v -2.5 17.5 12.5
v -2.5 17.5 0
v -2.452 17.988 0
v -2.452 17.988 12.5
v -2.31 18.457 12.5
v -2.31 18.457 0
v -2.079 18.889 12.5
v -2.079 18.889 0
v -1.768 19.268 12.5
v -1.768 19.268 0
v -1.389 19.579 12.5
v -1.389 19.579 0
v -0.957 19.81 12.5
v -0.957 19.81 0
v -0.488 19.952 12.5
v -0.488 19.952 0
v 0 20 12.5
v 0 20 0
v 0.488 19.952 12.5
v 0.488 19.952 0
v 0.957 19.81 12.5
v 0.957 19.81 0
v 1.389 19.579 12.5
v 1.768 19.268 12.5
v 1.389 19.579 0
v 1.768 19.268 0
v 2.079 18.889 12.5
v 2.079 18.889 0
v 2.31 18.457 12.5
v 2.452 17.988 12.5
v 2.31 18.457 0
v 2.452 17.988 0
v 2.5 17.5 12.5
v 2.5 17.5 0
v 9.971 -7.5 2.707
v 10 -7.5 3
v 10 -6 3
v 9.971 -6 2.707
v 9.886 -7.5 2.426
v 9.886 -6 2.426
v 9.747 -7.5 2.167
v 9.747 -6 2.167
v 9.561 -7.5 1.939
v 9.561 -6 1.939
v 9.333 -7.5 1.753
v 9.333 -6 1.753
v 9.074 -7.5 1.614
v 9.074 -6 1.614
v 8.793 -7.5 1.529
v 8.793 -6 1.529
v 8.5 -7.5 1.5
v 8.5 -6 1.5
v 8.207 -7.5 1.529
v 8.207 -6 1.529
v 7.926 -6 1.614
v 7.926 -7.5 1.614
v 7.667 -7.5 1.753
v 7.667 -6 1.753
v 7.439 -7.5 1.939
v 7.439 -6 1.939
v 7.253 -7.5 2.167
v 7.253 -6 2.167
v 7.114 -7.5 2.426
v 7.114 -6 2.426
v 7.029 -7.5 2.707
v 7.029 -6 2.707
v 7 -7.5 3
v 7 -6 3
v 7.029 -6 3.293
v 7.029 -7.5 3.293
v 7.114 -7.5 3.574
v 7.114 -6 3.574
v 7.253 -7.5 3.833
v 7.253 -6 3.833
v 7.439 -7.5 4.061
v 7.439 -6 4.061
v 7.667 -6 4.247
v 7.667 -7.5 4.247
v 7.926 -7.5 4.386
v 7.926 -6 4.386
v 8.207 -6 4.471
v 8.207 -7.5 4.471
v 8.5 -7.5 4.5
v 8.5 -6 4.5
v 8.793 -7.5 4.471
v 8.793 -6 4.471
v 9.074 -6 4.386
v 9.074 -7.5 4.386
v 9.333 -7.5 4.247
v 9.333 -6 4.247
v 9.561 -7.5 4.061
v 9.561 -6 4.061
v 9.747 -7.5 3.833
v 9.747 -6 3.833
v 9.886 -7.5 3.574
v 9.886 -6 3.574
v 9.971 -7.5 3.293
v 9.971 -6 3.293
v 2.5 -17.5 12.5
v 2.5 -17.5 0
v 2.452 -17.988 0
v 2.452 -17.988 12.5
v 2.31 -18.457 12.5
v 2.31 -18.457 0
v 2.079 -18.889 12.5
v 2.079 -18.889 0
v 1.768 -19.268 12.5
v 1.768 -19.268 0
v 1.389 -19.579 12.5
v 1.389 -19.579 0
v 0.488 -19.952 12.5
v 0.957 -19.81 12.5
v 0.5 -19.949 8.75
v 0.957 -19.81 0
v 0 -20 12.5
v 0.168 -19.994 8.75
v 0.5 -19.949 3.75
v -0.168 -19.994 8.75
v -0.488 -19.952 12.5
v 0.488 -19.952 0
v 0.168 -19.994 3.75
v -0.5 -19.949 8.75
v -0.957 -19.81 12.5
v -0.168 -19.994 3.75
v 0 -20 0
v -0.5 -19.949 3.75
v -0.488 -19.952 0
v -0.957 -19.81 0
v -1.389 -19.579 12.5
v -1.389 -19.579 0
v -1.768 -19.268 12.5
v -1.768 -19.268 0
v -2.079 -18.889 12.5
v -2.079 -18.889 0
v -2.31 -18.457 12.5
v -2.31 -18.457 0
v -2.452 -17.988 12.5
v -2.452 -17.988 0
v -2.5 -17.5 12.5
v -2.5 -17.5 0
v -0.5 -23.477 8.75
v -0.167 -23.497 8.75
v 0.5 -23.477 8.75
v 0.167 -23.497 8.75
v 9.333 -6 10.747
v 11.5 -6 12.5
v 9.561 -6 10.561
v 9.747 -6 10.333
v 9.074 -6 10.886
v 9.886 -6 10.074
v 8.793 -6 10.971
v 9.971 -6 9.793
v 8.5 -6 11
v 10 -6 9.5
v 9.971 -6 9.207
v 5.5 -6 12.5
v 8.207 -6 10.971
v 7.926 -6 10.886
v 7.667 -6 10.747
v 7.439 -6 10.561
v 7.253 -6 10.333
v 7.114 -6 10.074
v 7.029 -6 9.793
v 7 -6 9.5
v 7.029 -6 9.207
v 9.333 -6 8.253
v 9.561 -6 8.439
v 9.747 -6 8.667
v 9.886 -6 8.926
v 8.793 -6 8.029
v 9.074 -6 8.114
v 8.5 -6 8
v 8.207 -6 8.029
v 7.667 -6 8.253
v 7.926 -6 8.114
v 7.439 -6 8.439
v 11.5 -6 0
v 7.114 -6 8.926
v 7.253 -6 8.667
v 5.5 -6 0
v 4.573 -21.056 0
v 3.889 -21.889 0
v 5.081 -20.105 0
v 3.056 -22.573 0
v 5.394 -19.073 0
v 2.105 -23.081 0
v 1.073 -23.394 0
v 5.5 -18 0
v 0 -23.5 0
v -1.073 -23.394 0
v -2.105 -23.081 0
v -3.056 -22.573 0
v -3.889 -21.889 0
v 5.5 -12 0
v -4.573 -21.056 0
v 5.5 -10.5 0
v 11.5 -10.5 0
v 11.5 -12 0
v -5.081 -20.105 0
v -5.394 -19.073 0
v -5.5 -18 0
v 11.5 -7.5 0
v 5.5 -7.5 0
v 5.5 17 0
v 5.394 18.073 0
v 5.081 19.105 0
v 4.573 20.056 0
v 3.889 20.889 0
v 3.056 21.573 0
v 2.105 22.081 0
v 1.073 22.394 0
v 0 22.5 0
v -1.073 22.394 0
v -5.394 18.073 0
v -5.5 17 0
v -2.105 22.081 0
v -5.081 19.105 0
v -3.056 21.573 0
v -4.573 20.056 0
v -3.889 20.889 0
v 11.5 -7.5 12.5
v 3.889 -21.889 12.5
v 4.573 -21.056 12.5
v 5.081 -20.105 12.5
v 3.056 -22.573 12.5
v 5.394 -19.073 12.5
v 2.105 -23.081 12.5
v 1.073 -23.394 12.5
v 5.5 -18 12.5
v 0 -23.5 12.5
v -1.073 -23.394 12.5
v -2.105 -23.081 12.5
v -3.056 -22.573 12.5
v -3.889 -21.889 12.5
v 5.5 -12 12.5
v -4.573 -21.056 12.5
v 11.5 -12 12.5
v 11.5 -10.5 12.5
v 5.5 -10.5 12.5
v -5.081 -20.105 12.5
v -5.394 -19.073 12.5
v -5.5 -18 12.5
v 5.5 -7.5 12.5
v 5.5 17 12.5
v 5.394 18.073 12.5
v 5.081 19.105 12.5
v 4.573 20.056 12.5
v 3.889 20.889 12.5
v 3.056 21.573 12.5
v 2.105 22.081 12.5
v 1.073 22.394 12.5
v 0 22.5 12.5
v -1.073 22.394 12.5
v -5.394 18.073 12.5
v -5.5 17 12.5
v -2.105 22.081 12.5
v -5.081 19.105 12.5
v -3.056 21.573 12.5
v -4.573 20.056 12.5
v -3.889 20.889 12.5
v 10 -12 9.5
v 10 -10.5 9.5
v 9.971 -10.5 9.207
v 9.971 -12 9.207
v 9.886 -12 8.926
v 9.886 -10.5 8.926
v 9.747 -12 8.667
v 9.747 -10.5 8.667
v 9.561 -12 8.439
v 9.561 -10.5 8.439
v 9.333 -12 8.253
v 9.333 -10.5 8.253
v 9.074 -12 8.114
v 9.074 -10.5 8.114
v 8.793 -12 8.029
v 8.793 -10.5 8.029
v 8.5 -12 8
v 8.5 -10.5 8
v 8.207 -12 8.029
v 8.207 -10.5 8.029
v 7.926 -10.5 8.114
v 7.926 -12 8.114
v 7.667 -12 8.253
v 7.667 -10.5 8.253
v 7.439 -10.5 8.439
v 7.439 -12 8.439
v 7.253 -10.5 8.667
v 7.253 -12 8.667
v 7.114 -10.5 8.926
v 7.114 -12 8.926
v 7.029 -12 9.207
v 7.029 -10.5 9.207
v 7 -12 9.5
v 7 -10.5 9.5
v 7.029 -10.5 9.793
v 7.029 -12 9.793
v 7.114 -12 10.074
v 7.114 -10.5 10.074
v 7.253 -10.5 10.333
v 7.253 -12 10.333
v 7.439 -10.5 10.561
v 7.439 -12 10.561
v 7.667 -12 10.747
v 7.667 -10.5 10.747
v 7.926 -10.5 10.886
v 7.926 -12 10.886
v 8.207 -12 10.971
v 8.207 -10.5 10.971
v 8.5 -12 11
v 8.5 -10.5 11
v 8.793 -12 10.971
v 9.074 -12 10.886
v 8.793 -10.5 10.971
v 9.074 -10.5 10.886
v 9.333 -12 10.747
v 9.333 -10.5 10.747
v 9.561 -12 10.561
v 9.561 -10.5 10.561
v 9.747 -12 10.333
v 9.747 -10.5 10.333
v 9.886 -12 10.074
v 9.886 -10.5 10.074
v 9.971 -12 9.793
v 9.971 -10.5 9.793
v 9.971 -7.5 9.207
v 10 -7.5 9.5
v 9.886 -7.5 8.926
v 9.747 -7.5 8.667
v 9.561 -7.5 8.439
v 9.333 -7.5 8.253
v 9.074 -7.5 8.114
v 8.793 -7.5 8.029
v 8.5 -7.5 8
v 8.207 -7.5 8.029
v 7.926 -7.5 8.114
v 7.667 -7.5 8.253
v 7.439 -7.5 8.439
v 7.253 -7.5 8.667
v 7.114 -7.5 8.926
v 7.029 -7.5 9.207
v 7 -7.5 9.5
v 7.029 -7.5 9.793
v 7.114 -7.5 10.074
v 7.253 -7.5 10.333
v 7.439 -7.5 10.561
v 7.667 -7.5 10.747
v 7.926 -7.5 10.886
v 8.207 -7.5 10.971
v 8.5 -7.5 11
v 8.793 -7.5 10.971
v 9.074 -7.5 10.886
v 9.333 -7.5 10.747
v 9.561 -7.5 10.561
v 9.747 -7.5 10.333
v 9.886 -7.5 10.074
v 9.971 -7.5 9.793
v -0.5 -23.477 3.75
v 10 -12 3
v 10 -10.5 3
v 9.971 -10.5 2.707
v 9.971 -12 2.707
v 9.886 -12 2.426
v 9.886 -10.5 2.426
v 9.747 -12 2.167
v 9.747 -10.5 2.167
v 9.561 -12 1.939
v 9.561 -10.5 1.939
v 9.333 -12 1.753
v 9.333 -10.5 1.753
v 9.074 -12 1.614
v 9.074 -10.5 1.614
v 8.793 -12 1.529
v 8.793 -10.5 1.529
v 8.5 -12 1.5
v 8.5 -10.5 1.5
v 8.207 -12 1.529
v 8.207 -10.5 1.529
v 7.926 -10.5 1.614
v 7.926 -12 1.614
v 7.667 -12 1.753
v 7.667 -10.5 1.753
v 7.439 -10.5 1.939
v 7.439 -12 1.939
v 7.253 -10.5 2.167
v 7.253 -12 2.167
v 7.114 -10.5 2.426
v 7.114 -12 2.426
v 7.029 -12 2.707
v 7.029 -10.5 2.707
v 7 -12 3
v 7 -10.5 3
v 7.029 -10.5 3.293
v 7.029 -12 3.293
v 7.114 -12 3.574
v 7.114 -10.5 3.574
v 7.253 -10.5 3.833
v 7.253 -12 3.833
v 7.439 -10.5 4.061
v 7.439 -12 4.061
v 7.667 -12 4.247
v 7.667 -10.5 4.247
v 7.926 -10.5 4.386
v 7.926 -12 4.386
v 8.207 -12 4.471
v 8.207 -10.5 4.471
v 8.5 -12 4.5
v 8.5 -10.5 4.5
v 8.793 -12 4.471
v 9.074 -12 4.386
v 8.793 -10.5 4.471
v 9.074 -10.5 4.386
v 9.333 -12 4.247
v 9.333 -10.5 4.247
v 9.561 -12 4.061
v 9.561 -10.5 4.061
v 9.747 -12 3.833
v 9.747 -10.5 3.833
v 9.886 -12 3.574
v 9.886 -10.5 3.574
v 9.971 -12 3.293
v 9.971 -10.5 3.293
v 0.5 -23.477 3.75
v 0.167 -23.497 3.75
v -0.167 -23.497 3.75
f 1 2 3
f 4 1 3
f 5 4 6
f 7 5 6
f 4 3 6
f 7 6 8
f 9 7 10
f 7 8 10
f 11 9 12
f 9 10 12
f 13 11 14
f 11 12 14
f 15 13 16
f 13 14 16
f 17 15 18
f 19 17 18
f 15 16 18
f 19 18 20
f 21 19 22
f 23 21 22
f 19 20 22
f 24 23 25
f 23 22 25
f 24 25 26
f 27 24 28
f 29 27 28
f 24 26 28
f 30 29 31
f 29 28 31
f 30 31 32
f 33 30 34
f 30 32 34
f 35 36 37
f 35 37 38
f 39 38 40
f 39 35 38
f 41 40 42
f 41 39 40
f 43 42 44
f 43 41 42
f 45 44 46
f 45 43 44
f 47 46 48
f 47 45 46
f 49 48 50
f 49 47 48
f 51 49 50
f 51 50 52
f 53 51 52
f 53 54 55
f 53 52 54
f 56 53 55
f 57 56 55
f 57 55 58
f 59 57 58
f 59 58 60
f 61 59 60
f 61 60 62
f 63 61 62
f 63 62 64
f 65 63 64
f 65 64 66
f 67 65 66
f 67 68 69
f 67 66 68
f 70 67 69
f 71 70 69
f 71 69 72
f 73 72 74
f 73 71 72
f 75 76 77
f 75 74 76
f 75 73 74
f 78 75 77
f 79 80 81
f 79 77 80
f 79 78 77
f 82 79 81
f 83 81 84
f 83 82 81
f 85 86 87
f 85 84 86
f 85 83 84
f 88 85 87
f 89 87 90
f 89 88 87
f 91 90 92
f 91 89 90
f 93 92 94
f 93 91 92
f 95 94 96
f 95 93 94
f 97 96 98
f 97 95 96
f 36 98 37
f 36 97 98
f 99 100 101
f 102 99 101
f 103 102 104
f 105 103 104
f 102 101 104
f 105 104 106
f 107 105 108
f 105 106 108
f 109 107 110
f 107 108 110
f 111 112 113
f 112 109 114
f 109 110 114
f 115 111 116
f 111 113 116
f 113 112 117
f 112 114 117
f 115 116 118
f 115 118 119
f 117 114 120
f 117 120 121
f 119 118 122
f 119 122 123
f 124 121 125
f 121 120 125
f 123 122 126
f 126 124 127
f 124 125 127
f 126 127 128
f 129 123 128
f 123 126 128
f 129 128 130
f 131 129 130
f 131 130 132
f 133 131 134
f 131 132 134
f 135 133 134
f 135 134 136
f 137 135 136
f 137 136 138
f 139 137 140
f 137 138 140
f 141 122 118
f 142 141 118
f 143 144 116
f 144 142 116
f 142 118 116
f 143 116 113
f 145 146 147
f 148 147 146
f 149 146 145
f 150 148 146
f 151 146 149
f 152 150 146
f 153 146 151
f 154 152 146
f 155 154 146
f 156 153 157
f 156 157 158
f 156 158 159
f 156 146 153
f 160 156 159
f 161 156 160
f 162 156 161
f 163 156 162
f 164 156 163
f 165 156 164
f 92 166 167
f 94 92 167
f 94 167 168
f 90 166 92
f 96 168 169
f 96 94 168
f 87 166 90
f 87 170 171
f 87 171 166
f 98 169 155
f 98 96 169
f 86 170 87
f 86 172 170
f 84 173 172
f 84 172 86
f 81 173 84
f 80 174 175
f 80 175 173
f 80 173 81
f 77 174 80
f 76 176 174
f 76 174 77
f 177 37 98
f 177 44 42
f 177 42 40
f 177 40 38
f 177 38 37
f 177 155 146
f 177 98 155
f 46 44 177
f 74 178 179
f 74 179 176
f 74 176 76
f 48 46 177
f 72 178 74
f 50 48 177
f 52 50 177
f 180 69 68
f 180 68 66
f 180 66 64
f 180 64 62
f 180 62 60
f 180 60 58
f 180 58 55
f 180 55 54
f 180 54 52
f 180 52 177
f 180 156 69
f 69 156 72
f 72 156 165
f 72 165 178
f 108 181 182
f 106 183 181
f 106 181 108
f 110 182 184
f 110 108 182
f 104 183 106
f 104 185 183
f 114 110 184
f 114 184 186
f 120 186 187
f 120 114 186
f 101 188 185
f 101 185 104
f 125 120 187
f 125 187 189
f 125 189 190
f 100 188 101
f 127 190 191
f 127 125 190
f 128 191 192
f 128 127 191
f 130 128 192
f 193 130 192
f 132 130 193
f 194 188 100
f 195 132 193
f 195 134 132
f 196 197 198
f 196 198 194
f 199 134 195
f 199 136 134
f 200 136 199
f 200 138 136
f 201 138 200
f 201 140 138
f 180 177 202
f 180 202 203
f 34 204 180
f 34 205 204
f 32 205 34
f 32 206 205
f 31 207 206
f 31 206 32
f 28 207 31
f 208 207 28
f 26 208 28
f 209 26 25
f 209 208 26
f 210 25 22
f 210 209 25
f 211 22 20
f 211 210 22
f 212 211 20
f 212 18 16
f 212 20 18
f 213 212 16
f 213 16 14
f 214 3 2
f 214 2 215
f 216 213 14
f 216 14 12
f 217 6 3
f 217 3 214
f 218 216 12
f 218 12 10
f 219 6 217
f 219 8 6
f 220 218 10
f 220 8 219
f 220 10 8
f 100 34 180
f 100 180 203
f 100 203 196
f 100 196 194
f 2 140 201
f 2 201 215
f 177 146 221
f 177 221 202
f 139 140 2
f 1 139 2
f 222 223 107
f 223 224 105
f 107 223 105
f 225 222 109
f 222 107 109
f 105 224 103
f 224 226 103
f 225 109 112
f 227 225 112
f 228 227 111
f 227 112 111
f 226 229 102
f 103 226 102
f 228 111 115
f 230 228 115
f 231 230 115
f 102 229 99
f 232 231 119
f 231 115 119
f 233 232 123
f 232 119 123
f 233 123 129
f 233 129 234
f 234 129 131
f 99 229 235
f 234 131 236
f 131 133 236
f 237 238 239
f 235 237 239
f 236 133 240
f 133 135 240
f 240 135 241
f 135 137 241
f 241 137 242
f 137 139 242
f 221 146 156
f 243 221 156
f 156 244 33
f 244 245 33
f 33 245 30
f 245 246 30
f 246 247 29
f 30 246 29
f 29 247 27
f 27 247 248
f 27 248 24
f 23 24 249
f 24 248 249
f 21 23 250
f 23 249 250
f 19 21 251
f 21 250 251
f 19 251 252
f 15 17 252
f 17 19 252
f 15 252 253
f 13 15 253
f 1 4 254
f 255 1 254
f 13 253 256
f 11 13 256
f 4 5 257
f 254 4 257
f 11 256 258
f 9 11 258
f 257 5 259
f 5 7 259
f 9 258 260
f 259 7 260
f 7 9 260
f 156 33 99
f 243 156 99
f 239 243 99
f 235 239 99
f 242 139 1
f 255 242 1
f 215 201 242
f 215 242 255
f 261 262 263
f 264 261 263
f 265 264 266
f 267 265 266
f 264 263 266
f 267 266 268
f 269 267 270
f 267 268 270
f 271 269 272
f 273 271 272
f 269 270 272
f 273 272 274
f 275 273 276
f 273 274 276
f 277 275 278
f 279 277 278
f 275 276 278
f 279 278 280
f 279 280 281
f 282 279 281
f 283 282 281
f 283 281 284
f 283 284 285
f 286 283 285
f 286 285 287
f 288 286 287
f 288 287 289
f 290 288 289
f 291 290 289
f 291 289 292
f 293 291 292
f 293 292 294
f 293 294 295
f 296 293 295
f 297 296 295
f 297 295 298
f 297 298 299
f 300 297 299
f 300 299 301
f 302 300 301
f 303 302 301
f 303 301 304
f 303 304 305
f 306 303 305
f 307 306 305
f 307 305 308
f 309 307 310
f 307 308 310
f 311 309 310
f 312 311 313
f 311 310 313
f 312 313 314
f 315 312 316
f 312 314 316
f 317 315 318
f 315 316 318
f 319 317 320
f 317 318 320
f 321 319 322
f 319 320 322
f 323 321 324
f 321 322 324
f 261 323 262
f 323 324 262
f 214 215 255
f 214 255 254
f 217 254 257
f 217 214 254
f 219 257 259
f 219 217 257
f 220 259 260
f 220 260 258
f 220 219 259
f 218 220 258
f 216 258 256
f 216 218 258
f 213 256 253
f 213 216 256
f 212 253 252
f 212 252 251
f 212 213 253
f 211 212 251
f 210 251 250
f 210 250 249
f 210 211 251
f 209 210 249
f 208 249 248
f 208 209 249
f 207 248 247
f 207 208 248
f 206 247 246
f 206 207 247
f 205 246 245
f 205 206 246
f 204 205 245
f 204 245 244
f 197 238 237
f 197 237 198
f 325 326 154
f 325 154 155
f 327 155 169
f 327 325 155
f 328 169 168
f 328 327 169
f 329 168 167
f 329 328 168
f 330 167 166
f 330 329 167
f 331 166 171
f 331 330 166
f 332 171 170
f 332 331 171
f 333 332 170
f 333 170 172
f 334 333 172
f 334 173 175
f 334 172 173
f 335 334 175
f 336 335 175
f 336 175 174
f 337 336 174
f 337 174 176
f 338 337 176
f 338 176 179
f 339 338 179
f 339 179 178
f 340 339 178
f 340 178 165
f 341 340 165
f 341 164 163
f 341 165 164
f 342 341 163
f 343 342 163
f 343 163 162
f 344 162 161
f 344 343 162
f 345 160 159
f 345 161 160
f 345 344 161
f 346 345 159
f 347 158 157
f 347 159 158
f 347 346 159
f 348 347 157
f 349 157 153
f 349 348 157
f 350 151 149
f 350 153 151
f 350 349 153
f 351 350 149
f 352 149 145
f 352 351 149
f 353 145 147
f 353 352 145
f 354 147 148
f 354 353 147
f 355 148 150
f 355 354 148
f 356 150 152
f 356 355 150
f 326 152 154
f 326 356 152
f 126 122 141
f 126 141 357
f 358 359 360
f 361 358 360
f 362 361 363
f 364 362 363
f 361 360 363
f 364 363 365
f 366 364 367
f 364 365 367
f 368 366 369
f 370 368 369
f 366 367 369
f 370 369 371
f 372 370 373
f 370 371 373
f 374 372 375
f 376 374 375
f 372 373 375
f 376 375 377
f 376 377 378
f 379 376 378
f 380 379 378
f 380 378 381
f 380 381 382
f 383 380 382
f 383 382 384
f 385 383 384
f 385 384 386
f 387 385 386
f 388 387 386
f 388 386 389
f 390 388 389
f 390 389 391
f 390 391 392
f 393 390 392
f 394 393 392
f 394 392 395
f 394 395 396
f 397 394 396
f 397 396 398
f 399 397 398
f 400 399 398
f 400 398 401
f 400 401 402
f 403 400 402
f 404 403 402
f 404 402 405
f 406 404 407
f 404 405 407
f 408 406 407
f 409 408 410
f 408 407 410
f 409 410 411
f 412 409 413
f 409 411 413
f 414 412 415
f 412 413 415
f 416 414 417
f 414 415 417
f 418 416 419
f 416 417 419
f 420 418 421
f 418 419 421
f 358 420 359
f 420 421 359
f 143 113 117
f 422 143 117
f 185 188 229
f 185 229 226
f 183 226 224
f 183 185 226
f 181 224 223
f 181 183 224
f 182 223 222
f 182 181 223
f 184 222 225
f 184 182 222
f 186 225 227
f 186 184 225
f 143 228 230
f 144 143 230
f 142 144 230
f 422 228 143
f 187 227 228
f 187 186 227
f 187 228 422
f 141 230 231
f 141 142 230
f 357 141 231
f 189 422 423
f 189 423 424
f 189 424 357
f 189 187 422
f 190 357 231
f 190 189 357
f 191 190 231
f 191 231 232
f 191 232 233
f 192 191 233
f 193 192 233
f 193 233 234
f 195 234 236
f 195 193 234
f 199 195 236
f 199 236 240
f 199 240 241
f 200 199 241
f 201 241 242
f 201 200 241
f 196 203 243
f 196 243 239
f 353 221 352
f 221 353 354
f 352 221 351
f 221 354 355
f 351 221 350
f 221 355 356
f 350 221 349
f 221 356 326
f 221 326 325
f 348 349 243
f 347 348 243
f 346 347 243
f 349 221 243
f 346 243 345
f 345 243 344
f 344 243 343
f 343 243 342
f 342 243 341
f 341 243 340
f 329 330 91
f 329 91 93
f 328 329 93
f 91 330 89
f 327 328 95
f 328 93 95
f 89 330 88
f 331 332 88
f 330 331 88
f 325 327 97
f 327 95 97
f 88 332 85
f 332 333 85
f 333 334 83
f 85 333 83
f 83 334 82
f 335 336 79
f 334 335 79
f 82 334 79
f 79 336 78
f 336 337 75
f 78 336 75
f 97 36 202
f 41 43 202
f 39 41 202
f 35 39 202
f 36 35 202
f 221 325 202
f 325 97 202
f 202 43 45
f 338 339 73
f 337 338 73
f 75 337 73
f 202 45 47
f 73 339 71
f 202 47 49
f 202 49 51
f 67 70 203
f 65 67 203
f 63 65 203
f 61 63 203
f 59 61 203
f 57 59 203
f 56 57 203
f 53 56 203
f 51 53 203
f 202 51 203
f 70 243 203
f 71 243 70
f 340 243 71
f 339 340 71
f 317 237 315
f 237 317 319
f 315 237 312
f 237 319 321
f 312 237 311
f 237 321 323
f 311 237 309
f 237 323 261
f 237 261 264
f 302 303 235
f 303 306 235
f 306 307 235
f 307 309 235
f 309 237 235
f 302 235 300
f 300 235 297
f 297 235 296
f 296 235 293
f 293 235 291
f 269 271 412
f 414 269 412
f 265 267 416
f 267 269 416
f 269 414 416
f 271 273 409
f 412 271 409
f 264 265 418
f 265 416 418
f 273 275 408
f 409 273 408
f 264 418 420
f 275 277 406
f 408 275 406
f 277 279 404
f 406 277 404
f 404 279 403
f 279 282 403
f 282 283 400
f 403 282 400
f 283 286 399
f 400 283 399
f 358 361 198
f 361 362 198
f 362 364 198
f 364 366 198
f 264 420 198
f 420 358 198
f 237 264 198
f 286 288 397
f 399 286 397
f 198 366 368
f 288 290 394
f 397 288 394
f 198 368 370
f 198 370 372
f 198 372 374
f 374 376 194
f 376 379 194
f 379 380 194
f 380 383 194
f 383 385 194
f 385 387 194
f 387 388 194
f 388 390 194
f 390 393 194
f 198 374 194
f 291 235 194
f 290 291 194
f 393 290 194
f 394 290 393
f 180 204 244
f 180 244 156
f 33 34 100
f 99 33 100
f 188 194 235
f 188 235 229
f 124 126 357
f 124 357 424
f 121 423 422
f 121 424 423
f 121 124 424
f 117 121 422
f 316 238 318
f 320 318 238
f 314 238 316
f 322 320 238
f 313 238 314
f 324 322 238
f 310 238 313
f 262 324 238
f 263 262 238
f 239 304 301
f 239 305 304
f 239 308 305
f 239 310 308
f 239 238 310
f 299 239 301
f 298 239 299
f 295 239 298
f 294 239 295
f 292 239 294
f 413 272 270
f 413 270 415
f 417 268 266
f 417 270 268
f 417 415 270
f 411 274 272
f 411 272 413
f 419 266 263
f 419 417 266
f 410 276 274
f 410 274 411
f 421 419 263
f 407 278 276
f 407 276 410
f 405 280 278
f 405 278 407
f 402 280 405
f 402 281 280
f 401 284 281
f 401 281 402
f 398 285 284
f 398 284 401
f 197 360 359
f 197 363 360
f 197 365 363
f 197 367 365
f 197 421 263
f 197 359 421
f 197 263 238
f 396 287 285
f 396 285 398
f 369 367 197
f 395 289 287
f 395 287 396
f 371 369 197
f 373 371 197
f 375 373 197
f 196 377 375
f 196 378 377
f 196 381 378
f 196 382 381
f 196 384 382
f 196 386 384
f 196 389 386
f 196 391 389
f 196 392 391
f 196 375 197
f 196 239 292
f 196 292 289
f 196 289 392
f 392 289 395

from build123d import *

# Parameters (mm, degrees)
BOSS_EXTRUDE1_DEPTH     = 12.5
SKETCH2_W               = 12.5
SKETCH2_H               = 1.5
BOSS_EXTRUDE2_DEPTH     = 6
SKETCH3_R               = 1.5
CUT_EXTRUDE1_DEPTH      = 34.000006013
CUT_EXTRUDE1_DEPTH_BACK = 13.999994598
SKETCH5_W               = 1
SKETCH5_H               = 5
CUT_EXTRUDE2_DEPTH      = 24.499994598


with BuildPart() as part:
    # Sketch1 → Boss-Extrude1 (new body)
    with BuildSketch(Plane.XY):
        with BuildLine():
            Line((5.5, 17), (5.5, -18))
            ThreePointArc((5.5, -18), (-2.701e-06, -23.499994598), (-5.5, -17.999994598))
            Line((-5.5, -17.999994598), (-5.5, 17.000006013))
            ThreePointArc((-5.5, 17.000006013), (3.006e-06, 22.500006013), (5.5, 17))
        make_face()
        with BuildLine():
            Line((2.5, 17.5), (2.5, -17.5))
            ThreePointArc((2.5, -17.5), (0, -20), (-2.5, -17.5))
            Line((-2.5, -17.5), (-2.5, 17.5))
            ThreePointArc((-2.5, 17.5), (0, 20), (2.5, 17.5))
        make_face(mode=Mode.SUBTRACT)
    extrude(amount=BOSS_EXTRUDE1_DEPTH)

    # Sketch2 → Boss-Extrude2 (add)
    with BuildSketch(Plane(origin=(5.5, 0, 0), x_dir=(0, 0, -1), z_dir=(1, 0, 0))):
        with Locations((-6.25, -11.25)):
            Rectangle(SKETCH2_W, SKETCH2_H)
        with Locations((-6.25, -6.75)):
            Rectangle(SKETCH2_W, SKETCH2_H)
    extrude(amount=BOSS_EXTRUDE2_DEPTH)

    # Sketch3 → Cut-Extrude1 (cut, two sides)
    with BuildSketch(Plane(origin=(0, -10.5, 0), x_dir=(1, 0, 0), z_dir=(0, 1, 0))) as cut_extrude1_sk:
        with Locations((8.5, -3)):
            Circle(SKETCH3_R)
        with Locations((8.5, -9.5)):
            Circle(SKETCH3_R)
    extrude(amount=CUT_EXTRUDE1_DEPTH, mode=Mode.SUBTRACT)
    extrude(cut_extrude1_sk.sketch, amount=-CUT_EXTRUDE1_DEPTH_BACK, mode=Mode.SUBTRACT)

    # Sketch5 → Cut-Extrude2 (cut, through all)
    with BuildSketch(Plane(origin=(0, 0, 0), x_dir=(1, 0, 0), z_dir=(0, 1, 0))):
        with Locations((0, -6.25)):
            Rectangle(SKETCH5_W, SKETCH5_H)
    extrude(amount=-CUT_EXTRUDE2_DEPTH, mode=Mode.SUBTRACT)


solid = part.part
